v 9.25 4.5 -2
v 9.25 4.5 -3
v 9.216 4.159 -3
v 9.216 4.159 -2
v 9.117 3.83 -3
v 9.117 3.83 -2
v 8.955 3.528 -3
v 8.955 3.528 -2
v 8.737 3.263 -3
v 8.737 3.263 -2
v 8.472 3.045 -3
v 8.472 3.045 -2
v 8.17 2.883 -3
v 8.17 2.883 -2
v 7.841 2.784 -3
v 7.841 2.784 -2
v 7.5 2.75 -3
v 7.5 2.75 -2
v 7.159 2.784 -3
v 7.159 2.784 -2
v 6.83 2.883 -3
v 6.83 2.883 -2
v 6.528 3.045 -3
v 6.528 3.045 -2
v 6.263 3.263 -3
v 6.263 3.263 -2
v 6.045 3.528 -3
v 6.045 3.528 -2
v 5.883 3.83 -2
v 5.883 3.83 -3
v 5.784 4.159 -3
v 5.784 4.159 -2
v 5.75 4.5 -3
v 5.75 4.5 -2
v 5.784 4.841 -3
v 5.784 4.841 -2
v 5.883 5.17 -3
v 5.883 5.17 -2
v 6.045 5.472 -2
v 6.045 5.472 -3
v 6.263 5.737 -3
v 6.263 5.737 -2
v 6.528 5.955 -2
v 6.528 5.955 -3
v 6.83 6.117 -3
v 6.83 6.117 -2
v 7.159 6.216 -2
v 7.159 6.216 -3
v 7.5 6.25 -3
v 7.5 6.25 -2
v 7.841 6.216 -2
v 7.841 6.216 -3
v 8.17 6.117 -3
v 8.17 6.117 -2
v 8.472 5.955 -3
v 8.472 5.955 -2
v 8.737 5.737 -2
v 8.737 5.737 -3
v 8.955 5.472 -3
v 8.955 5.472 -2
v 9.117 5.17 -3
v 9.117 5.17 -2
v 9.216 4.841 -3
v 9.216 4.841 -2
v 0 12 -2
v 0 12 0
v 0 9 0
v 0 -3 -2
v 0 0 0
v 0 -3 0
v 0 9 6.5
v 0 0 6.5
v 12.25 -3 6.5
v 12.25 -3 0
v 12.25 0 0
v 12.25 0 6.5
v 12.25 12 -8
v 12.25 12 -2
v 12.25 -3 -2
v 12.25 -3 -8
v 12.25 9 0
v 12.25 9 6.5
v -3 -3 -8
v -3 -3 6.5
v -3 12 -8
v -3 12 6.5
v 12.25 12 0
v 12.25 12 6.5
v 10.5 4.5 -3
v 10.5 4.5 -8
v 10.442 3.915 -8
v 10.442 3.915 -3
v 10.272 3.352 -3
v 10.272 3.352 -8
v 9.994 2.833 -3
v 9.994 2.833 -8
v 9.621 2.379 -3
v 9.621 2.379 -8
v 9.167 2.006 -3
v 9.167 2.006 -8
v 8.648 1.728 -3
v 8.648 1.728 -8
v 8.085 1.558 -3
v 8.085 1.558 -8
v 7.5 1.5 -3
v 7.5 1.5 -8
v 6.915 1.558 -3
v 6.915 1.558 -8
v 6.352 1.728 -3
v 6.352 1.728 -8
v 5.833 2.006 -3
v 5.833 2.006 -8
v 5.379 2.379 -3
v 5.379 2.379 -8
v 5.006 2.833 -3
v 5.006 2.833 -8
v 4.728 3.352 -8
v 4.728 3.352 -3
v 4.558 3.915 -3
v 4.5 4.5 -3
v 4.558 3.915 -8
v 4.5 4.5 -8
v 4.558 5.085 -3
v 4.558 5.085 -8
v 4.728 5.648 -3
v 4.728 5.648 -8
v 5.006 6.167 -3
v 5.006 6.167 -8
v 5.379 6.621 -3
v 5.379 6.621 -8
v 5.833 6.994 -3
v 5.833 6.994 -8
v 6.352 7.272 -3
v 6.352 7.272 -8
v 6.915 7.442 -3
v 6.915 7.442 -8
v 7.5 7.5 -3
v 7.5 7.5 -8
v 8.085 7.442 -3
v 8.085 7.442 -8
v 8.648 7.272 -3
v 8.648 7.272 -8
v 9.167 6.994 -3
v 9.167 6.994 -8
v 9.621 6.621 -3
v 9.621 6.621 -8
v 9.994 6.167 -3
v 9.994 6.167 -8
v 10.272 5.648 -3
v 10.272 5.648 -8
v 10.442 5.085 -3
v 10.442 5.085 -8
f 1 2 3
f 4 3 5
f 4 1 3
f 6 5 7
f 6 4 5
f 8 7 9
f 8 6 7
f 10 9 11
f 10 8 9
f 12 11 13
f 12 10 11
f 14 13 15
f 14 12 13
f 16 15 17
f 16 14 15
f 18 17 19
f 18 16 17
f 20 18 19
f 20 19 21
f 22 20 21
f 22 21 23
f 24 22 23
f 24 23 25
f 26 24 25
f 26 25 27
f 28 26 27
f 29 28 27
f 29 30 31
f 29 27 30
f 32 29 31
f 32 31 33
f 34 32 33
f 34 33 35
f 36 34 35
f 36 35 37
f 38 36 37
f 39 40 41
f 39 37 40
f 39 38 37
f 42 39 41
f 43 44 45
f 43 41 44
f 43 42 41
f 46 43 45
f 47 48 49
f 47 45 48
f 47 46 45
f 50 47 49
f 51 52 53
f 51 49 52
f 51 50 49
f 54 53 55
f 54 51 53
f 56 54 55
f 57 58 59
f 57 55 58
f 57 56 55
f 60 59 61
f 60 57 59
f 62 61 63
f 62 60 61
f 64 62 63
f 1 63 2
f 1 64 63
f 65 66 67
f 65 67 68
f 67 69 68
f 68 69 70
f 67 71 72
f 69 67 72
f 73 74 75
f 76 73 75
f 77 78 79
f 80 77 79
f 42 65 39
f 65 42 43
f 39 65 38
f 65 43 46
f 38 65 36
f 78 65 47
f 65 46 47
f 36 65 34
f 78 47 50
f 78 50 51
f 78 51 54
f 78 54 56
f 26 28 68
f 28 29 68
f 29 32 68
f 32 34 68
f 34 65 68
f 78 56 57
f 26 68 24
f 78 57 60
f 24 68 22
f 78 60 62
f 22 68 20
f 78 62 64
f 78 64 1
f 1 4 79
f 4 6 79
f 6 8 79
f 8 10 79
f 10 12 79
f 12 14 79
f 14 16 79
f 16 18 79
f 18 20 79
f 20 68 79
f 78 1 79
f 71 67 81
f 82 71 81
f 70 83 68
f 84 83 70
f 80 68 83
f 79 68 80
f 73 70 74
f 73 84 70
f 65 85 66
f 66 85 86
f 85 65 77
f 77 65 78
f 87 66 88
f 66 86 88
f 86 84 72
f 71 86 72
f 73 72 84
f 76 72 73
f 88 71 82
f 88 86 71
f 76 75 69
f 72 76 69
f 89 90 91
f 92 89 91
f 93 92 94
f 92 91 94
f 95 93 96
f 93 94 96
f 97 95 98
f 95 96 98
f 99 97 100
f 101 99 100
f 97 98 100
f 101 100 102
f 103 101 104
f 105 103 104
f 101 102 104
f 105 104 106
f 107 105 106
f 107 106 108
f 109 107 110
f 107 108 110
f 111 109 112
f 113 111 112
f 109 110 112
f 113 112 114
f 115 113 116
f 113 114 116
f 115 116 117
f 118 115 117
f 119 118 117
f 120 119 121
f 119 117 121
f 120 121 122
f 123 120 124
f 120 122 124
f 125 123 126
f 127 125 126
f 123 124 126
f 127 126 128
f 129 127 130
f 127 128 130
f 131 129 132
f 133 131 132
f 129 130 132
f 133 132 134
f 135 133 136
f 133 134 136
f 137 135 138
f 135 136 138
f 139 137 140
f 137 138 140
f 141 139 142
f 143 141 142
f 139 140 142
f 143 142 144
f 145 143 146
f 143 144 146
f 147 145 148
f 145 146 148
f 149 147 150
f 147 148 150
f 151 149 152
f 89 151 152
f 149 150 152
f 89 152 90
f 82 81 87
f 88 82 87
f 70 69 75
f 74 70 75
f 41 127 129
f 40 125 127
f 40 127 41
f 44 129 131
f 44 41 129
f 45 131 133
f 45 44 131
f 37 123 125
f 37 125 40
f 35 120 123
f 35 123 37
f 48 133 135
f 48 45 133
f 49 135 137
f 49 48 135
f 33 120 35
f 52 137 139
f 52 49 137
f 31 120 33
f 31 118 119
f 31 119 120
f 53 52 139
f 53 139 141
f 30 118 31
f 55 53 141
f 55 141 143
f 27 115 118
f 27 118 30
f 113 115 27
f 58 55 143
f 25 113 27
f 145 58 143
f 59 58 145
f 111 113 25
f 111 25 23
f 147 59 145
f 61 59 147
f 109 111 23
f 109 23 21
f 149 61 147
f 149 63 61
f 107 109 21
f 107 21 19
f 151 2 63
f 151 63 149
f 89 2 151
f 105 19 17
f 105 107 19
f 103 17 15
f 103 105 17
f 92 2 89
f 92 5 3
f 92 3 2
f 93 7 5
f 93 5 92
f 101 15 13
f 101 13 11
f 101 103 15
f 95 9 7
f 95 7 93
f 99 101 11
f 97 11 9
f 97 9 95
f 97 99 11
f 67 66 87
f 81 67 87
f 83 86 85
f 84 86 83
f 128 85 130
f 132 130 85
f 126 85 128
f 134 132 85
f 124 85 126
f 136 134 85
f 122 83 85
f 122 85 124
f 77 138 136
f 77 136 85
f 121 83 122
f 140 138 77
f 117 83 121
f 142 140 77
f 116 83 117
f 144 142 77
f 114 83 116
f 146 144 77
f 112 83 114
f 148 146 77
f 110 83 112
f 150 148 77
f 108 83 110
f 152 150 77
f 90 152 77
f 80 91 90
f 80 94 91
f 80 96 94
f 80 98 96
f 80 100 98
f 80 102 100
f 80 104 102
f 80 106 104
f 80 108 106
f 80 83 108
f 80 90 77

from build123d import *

# Parameters (mm, degrees)
PAD_DEPTH    = 6.5
SKETCH001_W  = 15
SKETCH001_H  = 2
PAD001_DEPTH = 3
SKETCH002_W  = 15.25
SKETCH002_H  = 15
SKETCH002_R  = 1.75
PAD002_DEPTH = 6
SKETCH003_R  = 3
POCKET_DEPTH = 5


with BuildPart() as part:
    # Sketch → Pad (new body)
    with BuildSketch(Plane.XY):
        Polygon((0, 9), (12.25, 9), (12.25, 12), (-3, 12), (-3, -3), (12.25, -3), (12.25, 0), (0, 0), align=None)
    extrude(amount=PAD_DEPTH)

    # Sketch001 (on Face5 of Pad) → Pad001 (join)
    with BuildSketch(Plane(origin=(-3, 0, 0), x_dir=(0, -1, 0), z_dir=(-1, 0, 0))):
        with Locations((-4.5, -1)):
            Rectangle(SKETCH001_W, SKETCH001_H)
    extrude(amount=-PAD001_DEPTH)

    # Sketch002 (on Face11 of Pad001) → Pad002 (join)
    with BuildSketch(Plane(origin=(0, 0, -2), x_dir=(1, 0, 0), z_dir=(0, 0, -1))):
        with Locations((4.625, -4.5)):
            Rectangle(SKETCH002_W, SKETCH002_H)
        with Locations((7.5, -4.5)):
            Circle(SKETCH002_R, mode=Mode.SUBTRACT)
    extrude(amount=PAD002_DEPTH)

    # Sketch003 (on Face22 of Pad002) → Pocket (cut)
    with BuildSketch(Plane(origin=(0, 0, -8), x_dir=(1, 0, 0), z_dir=(0, 0, -1))):
        with Locations((7.5, -4.5)):
            Circle(SKETCH003_R)
    extrude(amount=-POCKET_DEPTH, mode=Mode.SUBTRACT)


solid = part.part
